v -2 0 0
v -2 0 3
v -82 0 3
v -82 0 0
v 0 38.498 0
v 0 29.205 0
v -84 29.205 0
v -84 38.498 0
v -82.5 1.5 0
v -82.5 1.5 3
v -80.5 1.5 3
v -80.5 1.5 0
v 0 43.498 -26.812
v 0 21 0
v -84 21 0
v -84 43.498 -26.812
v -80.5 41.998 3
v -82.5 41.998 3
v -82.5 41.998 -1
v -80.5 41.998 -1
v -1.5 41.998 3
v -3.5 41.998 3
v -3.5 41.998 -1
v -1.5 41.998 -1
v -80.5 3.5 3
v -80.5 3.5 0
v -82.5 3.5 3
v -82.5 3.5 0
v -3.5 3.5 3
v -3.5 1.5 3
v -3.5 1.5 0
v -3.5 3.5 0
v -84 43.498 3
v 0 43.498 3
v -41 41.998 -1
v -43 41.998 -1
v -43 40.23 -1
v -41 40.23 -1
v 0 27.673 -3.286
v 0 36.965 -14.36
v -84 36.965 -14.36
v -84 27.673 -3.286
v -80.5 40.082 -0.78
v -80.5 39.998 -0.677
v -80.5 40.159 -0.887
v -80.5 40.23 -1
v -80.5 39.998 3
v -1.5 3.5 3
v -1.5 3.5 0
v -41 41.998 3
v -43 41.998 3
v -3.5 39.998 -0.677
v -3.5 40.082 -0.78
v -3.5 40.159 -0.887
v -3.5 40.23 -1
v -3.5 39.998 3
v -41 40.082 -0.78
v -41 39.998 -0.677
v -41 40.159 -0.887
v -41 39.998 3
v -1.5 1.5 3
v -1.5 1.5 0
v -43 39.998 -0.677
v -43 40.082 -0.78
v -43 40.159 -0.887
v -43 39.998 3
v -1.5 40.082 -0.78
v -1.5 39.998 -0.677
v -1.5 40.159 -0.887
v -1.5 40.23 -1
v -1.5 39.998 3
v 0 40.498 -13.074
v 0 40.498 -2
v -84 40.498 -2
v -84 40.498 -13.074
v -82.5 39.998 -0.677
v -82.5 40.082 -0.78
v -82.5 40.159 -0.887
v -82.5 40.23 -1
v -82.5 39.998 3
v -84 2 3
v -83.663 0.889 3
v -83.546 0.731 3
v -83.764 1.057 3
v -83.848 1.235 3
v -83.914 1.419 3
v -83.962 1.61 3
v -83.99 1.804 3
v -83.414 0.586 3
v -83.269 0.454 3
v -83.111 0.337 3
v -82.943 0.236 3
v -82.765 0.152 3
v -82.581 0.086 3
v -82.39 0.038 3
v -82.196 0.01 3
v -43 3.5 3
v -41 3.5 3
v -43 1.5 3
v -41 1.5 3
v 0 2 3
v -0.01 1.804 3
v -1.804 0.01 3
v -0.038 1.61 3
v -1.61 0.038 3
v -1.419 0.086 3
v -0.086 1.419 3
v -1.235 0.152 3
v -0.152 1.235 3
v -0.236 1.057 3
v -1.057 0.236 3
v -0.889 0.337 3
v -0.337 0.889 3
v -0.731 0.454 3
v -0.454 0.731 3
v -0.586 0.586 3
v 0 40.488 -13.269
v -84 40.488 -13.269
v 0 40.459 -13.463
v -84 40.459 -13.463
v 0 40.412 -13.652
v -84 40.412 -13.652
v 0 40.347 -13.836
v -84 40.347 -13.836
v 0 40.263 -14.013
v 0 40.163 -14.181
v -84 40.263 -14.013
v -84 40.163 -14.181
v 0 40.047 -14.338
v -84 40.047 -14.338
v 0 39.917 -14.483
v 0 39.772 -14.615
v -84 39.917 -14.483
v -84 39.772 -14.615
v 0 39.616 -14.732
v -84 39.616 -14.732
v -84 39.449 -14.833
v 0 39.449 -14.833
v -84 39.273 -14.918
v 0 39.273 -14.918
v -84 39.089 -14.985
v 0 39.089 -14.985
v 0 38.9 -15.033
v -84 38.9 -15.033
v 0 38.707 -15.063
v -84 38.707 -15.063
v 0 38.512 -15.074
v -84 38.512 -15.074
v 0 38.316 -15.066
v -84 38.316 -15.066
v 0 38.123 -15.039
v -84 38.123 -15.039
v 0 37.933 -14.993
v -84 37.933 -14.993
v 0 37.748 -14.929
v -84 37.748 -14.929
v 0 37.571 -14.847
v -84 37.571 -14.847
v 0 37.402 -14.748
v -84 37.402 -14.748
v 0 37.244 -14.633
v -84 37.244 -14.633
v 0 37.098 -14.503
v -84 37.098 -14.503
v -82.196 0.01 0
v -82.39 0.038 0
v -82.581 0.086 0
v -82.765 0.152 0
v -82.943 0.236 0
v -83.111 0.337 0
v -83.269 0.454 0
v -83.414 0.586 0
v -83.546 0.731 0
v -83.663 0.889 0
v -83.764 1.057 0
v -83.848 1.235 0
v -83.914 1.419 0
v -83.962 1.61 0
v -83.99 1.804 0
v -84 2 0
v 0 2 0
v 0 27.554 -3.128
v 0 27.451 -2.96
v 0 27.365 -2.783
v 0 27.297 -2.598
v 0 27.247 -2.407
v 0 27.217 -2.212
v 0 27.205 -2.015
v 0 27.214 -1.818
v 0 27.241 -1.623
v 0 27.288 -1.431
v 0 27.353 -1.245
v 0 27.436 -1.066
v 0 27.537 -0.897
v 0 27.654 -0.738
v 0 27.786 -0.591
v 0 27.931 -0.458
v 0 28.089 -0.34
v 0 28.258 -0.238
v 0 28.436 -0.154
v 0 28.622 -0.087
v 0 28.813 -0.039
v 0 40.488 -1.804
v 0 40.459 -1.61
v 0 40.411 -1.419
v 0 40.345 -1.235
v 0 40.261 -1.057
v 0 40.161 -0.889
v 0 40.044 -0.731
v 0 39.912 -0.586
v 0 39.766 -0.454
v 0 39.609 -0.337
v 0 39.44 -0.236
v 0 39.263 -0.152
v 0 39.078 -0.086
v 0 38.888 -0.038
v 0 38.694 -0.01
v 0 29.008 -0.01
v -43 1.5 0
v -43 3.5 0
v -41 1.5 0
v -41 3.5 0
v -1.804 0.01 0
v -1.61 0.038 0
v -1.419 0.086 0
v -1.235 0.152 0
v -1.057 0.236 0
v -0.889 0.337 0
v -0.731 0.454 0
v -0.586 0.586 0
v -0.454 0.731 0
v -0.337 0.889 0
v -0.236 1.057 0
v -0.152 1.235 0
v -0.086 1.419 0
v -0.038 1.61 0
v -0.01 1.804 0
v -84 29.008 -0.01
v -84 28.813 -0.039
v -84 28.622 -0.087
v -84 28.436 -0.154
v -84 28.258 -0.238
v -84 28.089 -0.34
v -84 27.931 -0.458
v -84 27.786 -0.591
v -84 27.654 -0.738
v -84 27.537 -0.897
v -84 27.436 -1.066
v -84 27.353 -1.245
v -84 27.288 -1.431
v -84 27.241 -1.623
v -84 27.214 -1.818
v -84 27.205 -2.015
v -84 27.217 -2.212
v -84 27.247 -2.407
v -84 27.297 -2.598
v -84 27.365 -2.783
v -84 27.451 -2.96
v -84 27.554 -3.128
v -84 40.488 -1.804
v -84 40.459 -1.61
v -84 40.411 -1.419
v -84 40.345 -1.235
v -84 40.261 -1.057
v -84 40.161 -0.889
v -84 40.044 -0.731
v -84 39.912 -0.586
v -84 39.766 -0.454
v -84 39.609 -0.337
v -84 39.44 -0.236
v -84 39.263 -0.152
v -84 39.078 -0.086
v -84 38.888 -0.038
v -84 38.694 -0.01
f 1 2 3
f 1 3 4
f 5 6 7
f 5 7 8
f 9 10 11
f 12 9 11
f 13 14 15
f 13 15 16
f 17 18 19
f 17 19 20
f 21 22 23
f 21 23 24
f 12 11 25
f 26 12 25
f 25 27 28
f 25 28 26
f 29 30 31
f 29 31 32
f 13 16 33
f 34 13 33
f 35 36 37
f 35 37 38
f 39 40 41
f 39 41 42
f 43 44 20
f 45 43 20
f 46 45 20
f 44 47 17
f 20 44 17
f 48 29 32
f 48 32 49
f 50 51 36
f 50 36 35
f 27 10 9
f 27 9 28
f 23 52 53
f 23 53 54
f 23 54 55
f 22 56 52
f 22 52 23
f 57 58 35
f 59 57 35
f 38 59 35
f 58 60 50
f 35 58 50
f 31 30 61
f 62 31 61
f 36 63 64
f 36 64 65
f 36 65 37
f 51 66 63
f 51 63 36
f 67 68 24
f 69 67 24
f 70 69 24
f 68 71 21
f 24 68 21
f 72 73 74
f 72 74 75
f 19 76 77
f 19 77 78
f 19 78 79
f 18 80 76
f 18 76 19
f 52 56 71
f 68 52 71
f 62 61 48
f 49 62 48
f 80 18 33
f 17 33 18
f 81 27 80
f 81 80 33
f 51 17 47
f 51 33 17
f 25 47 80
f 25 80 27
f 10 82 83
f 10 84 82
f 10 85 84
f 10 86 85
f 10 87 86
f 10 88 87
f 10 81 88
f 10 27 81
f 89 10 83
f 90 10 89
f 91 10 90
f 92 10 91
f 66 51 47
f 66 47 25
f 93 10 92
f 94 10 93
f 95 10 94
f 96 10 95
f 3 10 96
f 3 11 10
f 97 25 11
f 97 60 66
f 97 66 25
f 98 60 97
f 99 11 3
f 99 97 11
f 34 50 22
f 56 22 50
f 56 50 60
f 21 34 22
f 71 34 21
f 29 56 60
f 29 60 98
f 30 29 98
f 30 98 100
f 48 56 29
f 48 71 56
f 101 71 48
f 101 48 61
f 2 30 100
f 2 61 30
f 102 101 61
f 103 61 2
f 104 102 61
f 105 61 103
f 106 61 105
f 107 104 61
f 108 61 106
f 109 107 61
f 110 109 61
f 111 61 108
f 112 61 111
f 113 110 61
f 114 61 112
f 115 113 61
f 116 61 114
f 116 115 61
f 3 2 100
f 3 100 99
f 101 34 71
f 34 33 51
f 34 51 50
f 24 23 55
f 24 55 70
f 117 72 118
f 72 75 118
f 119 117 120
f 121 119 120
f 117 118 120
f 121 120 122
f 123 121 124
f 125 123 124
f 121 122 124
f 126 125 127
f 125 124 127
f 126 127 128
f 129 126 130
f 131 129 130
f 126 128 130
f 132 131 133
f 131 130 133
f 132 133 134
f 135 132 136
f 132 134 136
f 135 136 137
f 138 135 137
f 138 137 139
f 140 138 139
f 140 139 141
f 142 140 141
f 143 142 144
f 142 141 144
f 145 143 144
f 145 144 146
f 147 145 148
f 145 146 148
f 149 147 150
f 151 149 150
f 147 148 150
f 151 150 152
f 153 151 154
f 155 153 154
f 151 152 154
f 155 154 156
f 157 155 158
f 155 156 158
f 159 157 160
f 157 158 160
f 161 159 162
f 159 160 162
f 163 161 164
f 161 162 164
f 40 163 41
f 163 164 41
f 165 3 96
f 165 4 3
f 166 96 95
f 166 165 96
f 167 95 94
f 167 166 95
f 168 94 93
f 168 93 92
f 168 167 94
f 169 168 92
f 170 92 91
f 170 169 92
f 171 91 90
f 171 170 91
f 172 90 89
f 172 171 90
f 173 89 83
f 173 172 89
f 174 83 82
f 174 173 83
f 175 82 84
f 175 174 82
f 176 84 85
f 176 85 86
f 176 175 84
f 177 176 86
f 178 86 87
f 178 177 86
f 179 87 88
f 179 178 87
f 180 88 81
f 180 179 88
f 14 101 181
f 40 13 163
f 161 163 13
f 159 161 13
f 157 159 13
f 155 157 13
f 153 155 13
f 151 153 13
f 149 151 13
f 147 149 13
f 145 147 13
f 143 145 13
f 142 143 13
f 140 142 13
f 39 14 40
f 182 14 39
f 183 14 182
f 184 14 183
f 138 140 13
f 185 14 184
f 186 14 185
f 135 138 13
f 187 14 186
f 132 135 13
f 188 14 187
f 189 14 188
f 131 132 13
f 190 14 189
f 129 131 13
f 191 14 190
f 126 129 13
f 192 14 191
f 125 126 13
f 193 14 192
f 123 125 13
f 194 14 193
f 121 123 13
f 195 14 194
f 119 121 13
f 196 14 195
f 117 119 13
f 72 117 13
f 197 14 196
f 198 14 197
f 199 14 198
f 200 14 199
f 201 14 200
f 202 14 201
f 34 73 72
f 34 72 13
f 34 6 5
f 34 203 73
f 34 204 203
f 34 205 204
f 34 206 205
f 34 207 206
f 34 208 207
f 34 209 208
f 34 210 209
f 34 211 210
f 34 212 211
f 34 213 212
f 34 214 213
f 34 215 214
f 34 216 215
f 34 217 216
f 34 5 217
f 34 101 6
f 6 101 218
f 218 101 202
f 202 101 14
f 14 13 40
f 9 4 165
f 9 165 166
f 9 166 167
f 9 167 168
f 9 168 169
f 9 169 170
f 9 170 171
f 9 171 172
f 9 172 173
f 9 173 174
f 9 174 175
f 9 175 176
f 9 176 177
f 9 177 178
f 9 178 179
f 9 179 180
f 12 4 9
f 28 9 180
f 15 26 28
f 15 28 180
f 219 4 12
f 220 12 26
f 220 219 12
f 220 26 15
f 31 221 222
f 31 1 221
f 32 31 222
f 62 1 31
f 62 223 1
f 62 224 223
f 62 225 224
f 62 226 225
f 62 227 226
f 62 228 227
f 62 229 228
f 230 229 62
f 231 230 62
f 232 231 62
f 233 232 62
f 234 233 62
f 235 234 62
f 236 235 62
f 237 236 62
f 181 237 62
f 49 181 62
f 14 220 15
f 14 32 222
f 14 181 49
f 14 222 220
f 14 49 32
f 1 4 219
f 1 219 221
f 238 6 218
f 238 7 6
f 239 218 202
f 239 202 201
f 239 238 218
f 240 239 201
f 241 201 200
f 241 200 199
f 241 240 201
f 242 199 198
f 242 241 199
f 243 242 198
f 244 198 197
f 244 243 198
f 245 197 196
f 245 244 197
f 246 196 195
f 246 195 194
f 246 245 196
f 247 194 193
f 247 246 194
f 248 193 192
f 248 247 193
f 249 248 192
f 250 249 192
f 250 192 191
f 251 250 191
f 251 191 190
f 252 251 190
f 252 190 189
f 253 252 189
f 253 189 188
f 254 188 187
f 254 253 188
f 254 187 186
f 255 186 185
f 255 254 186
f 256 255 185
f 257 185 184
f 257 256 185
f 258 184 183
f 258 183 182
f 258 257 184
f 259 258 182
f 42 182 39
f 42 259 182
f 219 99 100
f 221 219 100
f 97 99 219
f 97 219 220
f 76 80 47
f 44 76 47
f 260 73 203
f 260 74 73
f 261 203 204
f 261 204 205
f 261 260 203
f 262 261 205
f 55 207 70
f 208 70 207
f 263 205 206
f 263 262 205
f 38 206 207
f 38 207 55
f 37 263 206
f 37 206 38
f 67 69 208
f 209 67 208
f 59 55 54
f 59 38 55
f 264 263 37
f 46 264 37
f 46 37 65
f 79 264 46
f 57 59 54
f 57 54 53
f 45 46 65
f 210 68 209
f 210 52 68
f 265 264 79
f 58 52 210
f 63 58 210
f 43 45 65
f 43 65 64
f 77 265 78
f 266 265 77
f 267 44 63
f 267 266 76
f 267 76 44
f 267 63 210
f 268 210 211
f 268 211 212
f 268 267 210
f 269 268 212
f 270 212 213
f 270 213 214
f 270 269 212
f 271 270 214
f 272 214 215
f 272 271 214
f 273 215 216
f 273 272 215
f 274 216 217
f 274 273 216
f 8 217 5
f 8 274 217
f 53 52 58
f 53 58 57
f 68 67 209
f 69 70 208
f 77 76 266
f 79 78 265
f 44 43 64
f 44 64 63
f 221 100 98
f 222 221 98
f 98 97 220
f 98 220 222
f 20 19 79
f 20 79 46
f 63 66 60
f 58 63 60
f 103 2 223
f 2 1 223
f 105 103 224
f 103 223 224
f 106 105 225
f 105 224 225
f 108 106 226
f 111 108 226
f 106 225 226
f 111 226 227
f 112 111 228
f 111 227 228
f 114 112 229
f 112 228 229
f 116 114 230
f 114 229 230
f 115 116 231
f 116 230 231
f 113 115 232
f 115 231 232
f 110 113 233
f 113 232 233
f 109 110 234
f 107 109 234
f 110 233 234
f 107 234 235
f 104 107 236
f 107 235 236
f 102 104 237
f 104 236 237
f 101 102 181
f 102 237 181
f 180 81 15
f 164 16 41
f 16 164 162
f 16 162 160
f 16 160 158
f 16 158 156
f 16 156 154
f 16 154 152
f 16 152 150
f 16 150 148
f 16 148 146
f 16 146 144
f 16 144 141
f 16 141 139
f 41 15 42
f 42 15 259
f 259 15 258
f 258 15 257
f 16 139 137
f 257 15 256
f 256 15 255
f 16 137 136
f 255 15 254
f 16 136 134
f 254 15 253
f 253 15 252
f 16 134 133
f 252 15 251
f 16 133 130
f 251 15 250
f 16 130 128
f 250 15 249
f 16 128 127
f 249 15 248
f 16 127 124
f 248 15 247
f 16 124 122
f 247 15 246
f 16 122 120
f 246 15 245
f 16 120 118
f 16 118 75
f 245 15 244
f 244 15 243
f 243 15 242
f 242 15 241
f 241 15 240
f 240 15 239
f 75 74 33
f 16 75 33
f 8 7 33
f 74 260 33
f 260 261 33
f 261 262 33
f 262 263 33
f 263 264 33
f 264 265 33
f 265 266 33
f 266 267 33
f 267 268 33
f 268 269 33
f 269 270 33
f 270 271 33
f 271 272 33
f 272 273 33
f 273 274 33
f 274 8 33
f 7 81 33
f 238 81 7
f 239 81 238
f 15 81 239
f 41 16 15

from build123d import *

# Parameters (mm, degrees)
F1_DEPTH = 84
F2_R     = 2
F3_R     = 2
F4_W     = 2
F4_H     = 2
F5_DEPTH = 4


# Not quite as in the source:
# - a feature names something its author has since deleted; it is built from what else it names


with BuildPart() as f1:
    # F0 (on Right) → F1 (new body)
    with BuildSketch(Plane.YZ):
        Polygon((0, 3), (0, 0), (21, 0), (43.497566339, -26.8115555092), (43.497566339, 3), (21, 3), align=None)
        Polygon((40.497566339, -18.5691232508), (24.916221868, 0), (40.497566339, 0), align=None, mode=Mode.SUBTRACT)
    extrude(amount=-F1_DEPTH)

    # F2
    f2_edges = [f1.edges().sort_by_distance(p)[0] for p in [
        (0, 0, 1.5),
        (-84, 0, 1.5),
    ]]
    fillet(f2_edges, radius=F2_R)

    # F3
    f3_edges = [f1.edges().sort_by_distance(p)[0] for p in [
        (-42, 40.497566, 0),
        (-42, 40.497566, -18.569123),
        (-42, 24.916222, 0),
    ]]
    fillet(f3_edges, radius=F3_R)

    # F4 (on face) → F5 (cut)
    with BuildSketch(Plane.XY.offset(3)):
        with Locations((-42, 40.997566339)):
            Rectangle(F4_W, F4_H)
        with Locations((-2.5, 40.997566339)):
            Rectangle(F4_W, F4_H)
        with Locations((-2.5, 2.5)):
            Rectangle(F4_W, F4_H)
        with Locations((-42, 2.4999999997)):
            Rectangle(F4_W, F4_H)
        with Locations((-81.5, 2.5)):
            Rectangle(F4_W, F4_H)
        with Locations((-81.5, 40.997566339)):
            Rectangle(F4_W, F4_H)
    extrude(amount=-F5_DEPTH, mode=Mode.SUBTRACT)


solid = f1.part
